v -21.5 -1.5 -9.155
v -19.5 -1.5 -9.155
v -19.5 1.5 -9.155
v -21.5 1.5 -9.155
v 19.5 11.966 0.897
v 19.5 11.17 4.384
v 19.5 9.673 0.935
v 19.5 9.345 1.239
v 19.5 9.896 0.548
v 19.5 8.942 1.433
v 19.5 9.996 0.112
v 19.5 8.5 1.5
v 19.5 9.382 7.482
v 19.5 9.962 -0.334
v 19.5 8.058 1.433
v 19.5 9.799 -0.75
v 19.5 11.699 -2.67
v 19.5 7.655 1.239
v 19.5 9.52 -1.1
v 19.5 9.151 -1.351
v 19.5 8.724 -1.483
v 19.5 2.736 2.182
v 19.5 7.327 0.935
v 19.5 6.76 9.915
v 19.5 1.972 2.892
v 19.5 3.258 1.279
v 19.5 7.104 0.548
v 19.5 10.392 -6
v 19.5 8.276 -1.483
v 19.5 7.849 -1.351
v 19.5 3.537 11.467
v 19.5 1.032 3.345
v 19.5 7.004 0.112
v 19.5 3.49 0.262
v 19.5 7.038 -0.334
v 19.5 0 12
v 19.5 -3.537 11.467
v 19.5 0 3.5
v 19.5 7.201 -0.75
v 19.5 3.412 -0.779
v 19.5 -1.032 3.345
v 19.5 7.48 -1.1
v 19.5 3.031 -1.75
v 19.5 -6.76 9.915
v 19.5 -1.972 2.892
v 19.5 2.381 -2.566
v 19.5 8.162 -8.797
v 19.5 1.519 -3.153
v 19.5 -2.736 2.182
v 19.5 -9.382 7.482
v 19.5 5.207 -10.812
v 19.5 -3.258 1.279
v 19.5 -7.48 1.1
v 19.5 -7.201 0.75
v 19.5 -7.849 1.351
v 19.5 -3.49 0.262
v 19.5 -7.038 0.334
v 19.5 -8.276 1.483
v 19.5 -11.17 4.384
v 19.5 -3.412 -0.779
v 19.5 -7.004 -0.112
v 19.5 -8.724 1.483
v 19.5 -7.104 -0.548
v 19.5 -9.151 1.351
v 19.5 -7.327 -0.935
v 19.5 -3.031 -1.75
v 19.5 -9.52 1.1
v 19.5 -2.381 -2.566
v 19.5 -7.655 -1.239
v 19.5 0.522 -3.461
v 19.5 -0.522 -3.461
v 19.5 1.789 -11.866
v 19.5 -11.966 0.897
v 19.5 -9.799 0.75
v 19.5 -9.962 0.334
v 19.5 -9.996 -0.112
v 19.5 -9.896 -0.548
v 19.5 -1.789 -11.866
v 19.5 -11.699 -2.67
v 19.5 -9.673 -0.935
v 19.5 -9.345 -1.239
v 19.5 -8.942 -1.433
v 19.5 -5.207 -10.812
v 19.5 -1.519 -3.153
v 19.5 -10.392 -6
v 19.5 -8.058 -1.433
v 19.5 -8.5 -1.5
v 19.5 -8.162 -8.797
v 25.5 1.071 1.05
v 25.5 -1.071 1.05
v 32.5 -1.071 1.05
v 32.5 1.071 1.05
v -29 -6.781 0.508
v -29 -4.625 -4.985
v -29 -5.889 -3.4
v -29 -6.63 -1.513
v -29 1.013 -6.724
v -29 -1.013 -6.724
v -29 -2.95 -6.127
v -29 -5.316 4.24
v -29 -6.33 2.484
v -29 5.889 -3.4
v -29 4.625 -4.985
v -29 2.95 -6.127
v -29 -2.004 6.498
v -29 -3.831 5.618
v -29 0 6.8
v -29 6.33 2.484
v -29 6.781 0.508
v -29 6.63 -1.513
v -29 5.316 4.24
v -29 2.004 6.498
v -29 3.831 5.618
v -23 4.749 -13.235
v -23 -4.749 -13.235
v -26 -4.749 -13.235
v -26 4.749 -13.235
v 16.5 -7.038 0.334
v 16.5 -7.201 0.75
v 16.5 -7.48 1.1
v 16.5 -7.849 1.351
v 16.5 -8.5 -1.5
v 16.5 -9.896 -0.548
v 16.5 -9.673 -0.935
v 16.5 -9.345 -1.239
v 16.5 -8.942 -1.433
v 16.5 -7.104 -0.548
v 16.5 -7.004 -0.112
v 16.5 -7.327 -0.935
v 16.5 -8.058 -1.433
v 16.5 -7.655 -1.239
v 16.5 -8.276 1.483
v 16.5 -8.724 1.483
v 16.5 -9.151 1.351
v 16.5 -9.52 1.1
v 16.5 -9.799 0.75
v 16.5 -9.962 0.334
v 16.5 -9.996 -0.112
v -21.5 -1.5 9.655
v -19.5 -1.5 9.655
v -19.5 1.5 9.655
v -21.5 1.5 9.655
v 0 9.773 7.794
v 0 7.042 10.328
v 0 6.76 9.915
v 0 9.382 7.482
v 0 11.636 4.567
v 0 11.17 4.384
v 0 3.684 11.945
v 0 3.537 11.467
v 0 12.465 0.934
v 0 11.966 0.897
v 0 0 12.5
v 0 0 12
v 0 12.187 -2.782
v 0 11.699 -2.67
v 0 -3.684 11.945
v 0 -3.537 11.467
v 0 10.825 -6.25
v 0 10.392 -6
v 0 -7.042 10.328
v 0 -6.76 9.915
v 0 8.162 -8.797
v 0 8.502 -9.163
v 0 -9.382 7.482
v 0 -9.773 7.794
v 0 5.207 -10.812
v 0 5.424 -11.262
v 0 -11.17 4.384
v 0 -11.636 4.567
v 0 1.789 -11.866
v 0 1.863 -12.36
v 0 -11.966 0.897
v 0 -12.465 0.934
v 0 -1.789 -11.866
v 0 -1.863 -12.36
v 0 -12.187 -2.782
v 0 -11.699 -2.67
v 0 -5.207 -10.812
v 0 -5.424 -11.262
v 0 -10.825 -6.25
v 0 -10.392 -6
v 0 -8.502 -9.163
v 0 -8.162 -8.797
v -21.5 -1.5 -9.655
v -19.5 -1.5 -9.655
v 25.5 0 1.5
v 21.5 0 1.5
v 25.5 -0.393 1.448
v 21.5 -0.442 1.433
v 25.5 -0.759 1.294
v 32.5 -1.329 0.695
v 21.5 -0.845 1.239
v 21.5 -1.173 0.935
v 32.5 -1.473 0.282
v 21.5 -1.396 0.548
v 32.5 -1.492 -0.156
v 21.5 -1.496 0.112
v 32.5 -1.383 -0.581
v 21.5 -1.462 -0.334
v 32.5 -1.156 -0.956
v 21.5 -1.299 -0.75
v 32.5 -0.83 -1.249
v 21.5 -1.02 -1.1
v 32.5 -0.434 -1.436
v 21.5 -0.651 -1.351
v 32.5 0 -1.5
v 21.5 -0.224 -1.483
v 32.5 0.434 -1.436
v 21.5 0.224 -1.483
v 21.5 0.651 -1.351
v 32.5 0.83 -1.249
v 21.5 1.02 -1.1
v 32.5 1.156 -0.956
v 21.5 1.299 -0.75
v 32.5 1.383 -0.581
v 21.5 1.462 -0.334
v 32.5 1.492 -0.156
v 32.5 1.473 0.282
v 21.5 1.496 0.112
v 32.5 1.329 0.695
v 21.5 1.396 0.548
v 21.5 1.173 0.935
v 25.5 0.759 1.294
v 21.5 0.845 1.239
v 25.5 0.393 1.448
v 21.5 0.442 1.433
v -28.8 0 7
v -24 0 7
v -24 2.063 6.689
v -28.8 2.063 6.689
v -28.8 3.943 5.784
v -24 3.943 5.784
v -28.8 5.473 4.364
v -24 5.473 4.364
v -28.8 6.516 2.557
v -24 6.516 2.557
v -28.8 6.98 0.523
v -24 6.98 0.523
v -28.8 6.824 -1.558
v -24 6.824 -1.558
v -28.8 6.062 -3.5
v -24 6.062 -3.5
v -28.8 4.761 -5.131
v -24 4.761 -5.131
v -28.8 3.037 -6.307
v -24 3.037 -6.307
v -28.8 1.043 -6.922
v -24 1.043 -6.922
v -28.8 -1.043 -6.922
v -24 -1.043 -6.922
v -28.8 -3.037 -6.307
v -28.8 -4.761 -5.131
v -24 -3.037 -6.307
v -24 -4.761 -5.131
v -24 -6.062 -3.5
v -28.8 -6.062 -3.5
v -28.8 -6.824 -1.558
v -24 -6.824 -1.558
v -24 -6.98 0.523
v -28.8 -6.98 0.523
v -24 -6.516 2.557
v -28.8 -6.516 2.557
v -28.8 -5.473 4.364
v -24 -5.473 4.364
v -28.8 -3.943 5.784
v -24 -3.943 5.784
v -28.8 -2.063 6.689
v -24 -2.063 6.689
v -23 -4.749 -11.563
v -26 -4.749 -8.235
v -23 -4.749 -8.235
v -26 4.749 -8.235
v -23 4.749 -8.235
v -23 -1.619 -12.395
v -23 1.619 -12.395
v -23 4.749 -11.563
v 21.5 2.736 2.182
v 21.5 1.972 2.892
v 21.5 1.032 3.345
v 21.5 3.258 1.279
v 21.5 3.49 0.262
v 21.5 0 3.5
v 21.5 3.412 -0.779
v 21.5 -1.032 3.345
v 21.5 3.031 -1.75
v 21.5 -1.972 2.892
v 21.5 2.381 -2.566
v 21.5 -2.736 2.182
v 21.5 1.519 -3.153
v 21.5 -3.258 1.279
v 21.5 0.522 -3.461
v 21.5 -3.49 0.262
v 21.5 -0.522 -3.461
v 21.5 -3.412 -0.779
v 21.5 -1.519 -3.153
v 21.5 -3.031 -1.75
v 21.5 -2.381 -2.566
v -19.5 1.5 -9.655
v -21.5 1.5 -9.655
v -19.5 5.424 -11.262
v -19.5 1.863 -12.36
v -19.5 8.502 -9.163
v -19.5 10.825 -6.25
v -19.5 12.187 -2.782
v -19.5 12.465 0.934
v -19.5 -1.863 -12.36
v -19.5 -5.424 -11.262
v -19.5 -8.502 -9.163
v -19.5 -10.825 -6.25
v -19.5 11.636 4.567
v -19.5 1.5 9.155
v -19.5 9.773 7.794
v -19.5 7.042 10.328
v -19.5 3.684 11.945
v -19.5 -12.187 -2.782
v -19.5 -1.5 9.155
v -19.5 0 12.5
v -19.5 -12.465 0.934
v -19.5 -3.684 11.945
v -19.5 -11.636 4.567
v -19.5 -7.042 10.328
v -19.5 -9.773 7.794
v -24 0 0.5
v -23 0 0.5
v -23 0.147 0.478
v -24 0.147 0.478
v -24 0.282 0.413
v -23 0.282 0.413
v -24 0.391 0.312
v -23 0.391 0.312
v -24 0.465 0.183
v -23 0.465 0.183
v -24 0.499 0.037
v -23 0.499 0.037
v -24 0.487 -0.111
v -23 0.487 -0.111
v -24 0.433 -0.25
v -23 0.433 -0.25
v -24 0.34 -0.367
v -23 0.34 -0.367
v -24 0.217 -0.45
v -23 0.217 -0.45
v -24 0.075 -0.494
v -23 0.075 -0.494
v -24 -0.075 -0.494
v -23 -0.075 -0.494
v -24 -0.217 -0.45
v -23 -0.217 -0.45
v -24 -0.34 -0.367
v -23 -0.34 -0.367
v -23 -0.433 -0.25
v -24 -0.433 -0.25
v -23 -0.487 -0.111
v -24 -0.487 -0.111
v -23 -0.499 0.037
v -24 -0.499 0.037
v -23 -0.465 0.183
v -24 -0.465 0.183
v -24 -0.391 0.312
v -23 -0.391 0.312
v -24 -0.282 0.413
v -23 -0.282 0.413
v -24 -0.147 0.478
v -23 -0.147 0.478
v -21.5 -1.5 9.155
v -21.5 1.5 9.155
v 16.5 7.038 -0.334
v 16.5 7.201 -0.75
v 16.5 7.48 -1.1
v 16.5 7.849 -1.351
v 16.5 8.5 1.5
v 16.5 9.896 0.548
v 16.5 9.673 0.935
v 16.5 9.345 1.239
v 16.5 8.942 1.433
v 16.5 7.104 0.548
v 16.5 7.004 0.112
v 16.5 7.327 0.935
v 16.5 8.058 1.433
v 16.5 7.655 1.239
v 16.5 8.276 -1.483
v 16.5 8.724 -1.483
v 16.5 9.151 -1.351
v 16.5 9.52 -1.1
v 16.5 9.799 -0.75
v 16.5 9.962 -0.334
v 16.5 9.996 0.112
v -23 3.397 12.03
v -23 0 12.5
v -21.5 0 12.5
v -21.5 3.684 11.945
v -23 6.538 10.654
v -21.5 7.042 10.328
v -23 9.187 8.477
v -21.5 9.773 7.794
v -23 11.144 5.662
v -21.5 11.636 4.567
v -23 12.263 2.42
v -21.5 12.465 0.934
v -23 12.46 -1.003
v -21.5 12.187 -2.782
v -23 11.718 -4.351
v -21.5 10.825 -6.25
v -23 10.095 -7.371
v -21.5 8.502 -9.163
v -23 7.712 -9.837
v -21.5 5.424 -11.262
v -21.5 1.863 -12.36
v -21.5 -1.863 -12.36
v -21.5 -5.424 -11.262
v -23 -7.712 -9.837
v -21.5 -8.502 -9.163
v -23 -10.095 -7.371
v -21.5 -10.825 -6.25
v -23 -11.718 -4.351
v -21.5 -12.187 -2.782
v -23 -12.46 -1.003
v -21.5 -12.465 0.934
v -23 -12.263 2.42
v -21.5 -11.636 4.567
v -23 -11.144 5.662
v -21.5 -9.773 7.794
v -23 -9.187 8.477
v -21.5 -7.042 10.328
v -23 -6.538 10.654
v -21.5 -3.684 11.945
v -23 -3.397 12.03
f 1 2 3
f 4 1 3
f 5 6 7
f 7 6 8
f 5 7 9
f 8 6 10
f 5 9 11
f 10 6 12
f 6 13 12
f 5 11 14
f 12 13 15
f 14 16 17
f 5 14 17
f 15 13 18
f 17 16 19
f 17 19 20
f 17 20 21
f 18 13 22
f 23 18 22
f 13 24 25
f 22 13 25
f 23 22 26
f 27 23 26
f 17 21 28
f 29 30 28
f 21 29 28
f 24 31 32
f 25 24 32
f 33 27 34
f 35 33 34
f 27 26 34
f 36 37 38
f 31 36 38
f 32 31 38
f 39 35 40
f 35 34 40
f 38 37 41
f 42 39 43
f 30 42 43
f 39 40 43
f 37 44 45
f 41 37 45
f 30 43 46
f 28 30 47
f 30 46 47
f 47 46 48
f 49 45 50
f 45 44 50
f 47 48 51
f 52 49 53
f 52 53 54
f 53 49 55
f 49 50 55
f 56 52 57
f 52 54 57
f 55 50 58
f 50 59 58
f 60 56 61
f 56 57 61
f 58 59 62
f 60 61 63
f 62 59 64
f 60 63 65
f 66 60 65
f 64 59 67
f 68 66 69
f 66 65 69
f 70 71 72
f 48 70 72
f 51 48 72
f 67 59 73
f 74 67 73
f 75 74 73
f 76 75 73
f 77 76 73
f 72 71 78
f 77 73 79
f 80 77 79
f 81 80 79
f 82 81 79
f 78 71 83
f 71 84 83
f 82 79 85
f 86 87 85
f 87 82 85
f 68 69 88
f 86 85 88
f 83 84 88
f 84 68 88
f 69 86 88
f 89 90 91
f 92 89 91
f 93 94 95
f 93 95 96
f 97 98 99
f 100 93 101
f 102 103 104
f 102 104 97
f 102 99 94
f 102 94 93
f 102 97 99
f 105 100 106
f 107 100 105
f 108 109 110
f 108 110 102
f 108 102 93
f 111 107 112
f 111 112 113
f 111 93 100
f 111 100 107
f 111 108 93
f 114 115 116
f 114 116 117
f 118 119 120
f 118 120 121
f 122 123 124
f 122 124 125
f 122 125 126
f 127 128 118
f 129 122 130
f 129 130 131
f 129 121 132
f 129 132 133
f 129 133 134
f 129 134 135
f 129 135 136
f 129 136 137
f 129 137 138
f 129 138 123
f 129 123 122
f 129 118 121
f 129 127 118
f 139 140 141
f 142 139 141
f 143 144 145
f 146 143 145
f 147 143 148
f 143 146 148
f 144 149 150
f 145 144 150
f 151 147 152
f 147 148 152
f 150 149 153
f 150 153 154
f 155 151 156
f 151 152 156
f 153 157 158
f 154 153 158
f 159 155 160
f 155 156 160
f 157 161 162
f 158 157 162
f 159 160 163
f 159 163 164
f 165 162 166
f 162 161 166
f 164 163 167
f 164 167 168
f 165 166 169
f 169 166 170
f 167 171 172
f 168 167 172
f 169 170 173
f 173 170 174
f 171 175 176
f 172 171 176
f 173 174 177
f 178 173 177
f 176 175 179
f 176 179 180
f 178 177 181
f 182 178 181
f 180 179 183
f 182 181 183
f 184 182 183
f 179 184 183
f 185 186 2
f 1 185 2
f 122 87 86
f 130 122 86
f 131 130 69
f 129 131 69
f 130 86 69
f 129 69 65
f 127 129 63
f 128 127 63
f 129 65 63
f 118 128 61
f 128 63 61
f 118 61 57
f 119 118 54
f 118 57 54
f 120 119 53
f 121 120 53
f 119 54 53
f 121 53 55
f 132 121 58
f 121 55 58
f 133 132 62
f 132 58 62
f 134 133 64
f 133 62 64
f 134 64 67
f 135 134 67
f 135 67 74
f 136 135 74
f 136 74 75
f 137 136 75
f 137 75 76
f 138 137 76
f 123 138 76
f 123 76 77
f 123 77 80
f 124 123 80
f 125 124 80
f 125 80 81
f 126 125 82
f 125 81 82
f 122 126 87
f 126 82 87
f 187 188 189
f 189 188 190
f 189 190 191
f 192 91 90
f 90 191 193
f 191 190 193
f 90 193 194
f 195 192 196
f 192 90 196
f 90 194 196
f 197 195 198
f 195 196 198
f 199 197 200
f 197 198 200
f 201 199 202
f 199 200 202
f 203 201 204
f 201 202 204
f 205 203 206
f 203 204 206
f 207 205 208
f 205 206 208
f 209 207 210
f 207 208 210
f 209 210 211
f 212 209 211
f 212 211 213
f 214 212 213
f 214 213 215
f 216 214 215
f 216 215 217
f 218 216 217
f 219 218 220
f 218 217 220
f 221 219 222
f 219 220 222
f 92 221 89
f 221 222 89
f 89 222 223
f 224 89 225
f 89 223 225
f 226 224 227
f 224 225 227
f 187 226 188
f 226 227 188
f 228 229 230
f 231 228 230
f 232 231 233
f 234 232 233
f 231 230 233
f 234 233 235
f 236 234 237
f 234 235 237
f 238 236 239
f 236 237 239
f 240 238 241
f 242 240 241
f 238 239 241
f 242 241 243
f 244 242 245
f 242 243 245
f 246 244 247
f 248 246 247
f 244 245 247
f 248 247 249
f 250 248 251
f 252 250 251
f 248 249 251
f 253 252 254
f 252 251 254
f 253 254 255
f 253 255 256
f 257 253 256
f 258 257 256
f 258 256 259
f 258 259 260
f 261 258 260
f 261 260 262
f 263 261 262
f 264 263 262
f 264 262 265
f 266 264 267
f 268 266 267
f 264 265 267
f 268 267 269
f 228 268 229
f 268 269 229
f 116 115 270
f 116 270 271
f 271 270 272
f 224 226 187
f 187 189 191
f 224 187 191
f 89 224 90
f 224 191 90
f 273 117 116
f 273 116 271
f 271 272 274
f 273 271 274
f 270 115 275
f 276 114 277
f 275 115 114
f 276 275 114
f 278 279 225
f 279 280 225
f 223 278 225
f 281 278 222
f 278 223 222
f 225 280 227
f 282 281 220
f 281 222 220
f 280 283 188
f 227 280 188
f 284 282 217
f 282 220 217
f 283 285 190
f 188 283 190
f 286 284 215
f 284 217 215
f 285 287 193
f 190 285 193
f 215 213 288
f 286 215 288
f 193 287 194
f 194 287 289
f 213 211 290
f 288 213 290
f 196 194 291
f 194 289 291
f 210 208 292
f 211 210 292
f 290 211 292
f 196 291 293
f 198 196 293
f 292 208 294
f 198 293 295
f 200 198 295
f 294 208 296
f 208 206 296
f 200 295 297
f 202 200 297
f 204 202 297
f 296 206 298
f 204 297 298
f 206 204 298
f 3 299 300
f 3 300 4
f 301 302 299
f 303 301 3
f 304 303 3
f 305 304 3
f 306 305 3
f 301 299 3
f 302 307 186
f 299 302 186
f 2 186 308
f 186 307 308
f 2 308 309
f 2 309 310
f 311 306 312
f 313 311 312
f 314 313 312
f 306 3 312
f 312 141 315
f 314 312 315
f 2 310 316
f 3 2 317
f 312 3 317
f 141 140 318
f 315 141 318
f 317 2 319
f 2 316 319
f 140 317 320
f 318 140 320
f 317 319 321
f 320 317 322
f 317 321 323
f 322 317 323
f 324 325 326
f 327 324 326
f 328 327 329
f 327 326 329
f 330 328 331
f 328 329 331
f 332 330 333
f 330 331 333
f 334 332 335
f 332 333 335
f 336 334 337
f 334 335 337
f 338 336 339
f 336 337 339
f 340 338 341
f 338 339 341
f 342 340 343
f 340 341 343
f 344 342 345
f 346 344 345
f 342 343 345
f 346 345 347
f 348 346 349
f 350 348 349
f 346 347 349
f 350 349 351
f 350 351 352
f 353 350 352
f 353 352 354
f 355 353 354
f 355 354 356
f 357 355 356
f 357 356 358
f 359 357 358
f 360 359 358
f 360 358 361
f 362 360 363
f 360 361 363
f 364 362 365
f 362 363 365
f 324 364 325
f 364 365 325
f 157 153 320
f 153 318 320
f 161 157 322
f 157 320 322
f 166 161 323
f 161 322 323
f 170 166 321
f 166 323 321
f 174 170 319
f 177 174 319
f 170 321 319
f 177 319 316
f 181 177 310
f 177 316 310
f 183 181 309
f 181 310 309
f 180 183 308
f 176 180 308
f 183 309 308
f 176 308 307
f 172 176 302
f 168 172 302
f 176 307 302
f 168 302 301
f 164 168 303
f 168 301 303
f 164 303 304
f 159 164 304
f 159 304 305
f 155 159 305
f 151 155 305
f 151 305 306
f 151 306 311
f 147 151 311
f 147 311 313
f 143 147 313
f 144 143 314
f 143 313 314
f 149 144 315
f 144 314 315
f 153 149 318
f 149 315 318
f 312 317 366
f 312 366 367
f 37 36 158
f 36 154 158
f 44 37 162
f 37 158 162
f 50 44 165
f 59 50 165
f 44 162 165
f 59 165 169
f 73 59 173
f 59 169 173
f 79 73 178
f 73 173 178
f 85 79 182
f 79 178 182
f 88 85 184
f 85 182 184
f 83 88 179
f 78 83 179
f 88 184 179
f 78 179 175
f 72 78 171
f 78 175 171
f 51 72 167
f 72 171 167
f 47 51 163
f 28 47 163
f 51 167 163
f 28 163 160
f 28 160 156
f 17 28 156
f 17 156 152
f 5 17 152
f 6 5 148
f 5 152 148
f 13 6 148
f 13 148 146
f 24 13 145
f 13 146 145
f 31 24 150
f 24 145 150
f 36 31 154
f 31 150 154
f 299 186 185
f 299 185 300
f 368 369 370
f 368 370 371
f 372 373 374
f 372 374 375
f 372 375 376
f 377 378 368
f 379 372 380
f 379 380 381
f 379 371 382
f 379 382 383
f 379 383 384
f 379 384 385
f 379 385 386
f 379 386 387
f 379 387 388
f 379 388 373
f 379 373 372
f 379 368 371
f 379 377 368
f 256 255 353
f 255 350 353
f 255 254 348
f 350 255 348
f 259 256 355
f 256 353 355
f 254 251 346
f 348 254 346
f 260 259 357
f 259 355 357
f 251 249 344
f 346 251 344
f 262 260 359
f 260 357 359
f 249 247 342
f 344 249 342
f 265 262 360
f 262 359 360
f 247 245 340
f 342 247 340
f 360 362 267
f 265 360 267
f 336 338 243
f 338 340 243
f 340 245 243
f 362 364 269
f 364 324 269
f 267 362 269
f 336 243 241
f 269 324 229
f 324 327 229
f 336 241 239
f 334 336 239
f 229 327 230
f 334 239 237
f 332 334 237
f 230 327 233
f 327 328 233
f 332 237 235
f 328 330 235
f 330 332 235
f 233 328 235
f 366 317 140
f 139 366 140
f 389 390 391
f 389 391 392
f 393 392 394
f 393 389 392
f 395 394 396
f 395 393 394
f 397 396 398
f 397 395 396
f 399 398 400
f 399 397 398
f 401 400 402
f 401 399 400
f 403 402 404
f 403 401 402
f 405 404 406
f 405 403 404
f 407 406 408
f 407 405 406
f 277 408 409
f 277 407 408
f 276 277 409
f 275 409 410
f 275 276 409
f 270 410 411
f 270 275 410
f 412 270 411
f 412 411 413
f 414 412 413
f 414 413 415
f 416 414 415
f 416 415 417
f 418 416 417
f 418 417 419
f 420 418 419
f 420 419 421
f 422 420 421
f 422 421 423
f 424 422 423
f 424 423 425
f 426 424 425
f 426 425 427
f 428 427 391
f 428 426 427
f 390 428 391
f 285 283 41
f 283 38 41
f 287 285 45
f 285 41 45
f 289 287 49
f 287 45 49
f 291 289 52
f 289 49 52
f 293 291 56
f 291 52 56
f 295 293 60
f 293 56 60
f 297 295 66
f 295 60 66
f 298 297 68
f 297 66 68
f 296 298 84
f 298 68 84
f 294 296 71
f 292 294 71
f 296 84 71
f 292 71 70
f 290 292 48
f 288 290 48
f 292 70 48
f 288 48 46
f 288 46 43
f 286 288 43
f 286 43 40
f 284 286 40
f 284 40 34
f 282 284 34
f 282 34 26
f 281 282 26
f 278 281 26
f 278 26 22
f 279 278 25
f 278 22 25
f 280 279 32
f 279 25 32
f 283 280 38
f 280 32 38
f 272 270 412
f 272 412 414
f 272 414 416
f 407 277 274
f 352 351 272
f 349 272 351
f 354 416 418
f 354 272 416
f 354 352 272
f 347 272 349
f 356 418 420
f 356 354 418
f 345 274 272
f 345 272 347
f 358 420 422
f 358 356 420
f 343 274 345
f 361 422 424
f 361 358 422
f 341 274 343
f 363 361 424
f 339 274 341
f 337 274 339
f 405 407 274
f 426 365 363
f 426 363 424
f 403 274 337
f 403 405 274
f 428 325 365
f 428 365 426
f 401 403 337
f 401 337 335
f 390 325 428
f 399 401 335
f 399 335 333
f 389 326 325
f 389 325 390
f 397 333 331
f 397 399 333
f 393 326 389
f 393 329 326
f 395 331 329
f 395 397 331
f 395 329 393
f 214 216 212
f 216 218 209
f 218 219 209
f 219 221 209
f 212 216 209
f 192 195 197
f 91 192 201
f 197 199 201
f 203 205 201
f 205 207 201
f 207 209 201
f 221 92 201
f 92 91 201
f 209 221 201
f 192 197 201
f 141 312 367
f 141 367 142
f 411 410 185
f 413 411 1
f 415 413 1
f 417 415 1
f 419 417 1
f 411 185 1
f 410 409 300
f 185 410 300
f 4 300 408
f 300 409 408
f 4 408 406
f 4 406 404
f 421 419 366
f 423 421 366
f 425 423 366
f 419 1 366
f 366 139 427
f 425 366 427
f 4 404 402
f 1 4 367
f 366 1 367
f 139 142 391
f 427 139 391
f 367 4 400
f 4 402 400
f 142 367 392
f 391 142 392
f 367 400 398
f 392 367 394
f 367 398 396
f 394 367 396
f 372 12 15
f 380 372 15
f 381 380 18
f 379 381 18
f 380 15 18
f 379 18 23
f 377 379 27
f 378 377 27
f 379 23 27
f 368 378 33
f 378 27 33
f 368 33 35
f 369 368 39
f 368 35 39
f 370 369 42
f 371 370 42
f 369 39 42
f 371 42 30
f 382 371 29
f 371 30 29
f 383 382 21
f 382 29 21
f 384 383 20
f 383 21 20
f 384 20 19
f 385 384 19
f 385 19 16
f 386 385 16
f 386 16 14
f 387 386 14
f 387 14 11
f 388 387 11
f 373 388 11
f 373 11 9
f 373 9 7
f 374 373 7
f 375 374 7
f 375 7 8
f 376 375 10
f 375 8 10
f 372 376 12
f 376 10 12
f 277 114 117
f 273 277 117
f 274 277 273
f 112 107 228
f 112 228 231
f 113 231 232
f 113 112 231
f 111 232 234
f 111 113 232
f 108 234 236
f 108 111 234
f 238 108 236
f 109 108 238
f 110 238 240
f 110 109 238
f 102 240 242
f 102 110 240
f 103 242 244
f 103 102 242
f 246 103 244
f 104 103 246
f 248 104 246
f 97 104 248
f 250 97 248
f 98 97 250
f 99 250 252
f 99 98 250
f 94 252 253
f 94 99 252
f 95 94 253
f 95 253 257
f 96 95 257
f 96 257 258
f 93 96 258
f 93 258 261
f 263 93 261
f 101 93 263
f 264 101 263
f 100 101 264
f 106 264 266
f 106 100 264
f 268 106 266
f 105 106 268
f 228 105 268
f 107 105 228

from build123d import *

# Parameters (mm, degrees)
SKETCH_2_R               = 1.5
CUT_EXTRUDE_1_DEPTH      = 3
SKETCH_3_W               = 0.5
SKETCH_3_H               = 3
EXTRUDE_1_DEPTH          = 2
EXTRUDE_START            = 1.5
SKETCH_4_R               = 12.5
EXTRUDE_2_DEPTH          = 1.5
SKETCH_5_R               = 0.5
EXTRUDE_3_DEPTH          = 1
SKETCH_6_R               = 7
EXTRUDE_4_DEPTH          = 5
SKETCH_7_W               = 5
SKETCH_7_H               = 9.498376428
EXTRUDE_5_DEPTH          = 3
CHAMFER_1_SIZE           = 0.2
CUT_EXTRUDE_2_DEPTH      = 38.251363929
CUT_EXTRUDE_2_DEPTH_BACK = 38.251363929
SKETCH_8_W               = 7
SKETCH_8_H               = 0.45


with BuildPart() as part:
    # 草图1 → 旋转1 (revolve)
    with BuildSketch(Plane.XY, mode=Mode.PRIVATE) as revolve_1_sk:
        Polygon((0, 12), (0, 12.5), (-19.5, 12.5), (-19.5, 0), (19.5, 0), (32.5, 0), (32.5, 1.5), (21.5, 1.5), (21.5, 3.5), (19.5, 3.5), (19.5, 12), align=None)
    revolve(revolve_1_sk.sketch.rotate(Axis((-61.965581957, 0, 0), (1, 0, 0)), 90), axis=Axis((-61.965581957, 0, 0), (1, 0, 0)))

    # 草图2 → 切除-拉伸1 (cut)
    with BuildSketch(Plane(origin=(19.5, 0, 0), x_dir=(0, 0, -1), z_dir=(1, 0, 0))):
        with Locations((0, -8.5)):
            Circle(SKETCH_2_R)
        with Locations(Location((0, 8.5, 0), (0, 0, 180))):
            Circle(SKETCH_2_R)
    extrude(amount=-CUT_EXTRUDE_1_DEPTH, mode=Mode.SUBTRACT)

    # 草图3 → 凸台-拉伸1 (add)
    with BuildSketch(Plane.ZY.offset(19.5)):
        with Locations((-9.404663304, 0)):
            Rectangle(SKETCH_3_W, SKETCH_3_H)
        with Locations((9.404663304, 0)):
            Rectangle(SKETCH_3_W, SKETCH_3_H)
    extrude(amount=EXTRUDE_1_DEPTH)

    # 草图4 → 凸台-拉伸2 (add)
    with BuildSketch(Plane.ZY.offset(21.5).offset(EXTRUDE_START)):
        Circle(SKETCH_4_R)
    extrude(amount=-EXTRUDE_2_DEPTH)

    # 草图5 → 凸台-拉伸3 (add)
    with BuildSketch(Plane.ZY.offset(23)):
        Circle(SKETCH_5_R)
    extrude(amount=EXTRUDE_3_DEPTH)

    # 草图6 → 凸台-拉伸4 (add)
    with BuildSketch(Plane.ZY.offset(24)):
        Circle(SKETCH_6_R)
    extrude(amount=EXTRUDE_4_DEPTH)

    # 草图7 → 凸台-拉伸5 (add)
    with BuildSketch(Plane.ZY.offset(23)):
        with Locations((-10.734958049, 0)):
            Rectangle(SKETCH_7_W, SKETCH_7_H)
    extrude(amount=EXTRUDE_5_DEPTH)

    # 倒角1
    chamfer_1_edges = [part.edges().sort_by_distance(p)[0] for p in [
        (-29, 0, -7),
    ]]
    chamfer(chamfer_1_edges, length=CHAMFER_1_SIZE)

    # 草图8 → 切除-拉伸2 (cut, two sides: drawn at the far end of the back side and taken through both)
    with BuildSketch(Plane(origin=(0, 0, 0), x_dir=(1, 0, 0), z_dir=(0, 1, 0)).offset(-CUT_EXTRUDE_2_DEPTH_BACK)):
        with Locations((29, -1.275)):
            Rectangle(SKETCH_8_W, SKETCH_8_H)
    extrude(amount=CUT_EXTRUDE_2_DEPTH + CUT_EXTRUDE_2_DEPTH_BACK, mode=Mode.SUBTRACT)


solid = part.part
